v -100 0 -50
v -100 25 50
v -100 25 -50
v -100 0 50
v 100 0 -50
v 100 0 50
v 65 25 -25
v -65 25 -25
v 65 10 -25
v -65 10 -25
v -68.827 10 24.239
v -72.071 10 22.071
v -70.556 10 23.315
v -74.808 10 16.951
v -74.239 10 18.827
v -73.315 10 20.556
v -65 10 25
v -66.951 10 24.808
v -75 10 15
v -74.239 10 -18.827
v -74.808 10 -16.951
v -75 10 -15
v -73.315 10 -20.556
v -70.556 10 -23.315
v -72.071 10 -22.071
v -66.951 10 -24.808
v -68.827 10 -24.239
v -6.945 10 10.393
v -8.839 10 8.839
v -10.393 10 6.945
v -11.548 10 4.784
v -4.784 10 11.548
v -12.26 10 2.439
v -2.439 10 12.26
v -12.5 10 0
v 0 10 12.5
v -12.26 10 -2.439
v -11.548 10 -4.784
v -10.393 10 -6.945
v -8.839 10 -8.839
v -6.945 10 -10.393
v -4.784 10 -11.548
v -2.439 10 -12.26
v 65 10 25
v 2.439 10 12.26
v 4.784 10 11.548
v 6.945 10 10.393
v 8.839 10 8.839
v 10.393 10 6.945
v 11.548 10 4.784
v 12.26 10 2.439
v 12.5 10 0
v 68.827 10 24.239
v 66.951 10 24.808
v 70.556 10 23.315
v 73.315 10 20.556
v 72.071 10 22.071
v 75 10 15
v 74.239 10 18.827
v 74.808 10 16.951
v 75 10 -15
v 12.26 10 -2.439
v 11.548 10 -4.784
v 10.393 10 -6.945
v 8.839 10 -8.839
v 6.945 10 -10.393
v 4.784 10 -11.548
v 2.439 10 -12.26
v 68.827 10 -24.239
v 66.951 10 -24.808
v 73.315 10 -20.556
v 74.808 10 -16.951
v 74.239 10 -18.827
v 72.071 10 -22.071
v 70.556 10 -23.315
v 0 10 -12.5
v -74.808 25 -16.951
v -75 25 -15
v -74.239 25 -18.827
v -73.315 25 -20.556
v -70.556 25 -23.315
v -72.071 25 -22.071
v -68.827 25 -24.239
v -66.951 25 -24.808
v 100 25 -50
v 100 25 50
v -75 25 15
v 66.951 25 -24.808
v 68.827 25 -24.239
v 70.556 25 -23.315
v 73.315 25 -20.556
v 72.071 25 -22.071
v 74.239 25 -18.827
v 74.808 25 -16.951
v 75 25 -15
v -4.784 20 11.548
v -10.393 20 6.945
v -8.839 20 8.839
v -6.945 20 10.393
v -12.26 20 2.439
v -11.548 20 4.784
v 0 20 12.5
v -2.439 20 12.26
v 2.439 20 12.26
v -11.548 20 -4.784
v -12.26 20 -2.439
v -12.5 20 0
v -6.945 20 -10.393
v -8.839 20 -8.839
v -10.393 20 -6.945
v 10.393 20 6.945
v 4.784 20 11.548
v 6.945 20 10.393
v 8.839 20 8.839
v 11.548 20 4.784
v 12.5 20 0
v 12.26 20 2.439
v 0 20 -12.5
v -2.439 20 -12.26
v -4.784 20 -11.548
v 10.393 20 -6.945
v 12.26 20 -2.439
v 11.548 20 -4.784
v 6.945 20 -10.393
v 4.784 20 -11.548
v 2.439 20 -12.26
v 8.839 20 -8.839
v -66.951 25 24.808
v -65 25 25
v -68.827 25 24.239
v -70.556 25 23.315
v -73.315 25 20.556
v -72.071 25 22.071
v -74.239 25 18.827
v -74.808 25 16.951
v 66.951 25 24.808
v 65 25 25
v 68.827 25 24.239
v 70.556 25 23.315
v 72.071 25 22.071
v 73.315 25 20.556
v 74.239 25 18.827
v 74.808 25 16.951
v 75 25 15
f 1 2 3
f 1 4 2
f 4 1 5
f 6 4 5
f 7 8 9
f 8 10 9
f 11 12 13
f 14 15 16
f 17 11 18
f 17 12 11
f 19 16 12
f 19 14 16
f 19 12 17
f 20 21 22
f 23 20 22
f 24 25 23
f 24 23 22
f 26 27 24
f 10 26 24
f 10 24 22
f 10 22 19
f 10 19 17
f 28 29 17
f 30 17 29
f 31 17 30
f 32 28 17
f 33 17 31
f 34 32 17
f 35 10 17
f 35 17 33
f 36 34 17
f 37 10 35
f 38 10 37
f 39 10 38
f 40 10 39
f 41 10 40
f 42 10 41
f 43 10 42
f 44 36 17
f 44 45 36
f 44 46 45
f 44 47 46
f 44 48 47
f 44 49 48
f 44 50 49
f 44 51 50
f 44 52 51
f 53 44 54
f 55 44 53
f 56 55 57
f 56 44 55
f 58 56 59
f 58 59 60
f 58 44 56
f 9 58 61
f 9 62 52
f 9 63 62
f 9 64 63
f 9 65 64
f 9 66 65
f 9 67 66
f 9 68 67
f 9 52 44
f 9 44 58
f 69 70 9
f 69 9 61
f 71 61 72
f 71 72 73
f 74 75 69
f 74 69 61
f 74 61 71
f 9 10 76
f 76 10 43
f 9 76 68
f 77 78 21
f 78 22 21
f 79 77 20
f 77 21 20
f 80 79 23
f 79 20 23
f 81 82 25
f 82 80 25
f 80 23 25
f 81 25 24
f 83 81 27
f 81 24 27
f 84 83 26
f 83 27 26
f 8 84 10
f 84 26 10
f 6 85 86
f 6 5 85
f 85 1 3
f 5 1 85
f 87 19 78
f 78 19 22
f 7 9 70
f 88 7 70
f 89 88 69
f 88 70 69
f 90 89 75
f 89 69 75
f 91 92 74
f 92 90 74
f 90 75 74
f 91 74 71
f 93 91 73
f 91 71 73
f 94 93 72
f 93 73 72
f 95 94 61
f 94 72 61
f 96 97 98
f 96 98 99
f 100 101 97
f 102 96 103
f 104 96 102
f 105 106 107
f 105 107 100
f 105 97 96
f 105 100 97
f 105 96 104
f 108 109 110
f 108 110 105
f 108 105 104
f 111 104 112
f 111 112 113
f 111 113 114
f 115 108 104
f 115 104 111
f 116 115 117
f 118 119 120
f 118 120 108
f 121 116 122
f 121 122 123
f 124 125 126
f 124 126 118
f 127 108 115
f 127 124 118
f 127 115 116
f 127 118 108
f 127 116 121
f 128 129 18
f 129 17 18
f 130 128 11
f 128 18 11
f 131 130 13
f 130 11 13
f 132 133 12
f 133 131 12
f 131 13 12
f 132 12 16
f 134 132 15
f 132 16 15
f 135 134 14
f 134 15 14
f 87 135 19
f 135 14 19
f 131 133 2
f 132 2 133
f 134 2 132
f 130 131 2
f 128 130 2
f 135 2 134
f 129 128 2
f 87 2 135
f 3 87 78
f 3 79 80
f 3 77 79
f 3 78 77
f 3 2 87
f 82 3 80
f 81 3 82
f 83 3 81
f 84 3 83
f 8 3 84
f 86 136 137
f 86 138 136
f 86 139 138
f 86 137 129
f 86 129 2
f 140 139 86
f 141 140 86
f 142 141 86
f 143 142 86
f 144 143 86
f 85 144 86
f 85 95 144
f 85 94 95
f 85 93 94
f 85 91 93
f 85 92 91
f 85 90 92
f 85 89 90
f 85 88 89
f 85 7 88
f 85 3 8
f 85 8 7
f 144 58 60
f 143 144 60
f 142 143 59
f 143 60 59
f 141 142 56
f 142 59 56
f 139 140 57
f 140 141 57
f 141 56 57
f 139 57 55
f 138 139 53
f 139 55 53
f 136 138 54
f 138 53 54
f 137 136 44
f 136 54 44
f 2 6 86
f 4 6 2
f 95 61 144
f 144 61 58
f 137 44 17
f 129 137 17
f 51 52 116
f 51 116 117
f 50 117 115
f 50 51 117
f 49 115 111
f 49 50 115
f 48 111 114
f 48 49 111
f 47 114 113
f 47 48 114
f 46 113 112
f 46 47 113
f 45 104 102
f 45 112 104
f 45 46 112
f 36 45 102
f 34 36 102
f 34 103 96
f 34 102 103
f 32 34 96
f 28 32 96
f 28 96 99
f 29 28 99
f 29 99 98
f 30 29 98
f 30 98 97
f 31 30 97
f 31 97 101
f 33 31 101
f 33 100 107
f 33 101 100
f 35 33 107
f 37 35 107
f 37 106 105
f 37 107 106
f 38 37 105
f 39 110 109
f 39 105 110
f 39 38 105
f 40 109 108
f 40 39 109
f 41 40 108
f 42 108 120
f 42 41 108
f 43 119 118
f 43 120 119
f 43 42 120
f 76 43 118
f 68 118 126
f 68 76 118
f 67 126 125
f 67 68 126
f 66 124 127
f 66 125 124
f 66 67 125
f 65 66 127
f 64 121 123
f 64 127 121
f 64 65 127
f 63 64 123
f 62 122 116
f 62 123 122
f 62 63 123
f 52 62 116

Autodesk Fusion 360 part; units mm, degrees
sketch "Sketch1" plane through (0, 0, 0) normal (0, 1, 0) x (1, 0, 0)
  line L0 (100, -50) -> (-100, -50)
  line L1 (-100, -50) -> (-100, 50)
  line L2 (-100, 50) -> (100, 50)
  line L3 (100, 50) -> (100, -50)
  line L4 (100, -50) -> (-100, 50) construction
  line L5 (-100, -50) -> (100, 50) construction
  line L6 (65, -25) -> (-65, -25)
  line L7 (-75, -15) -> (-75, 15)
  line L8 (-65, 25) -> (65, 25)
  line L9 (75, 15) -> (75, -15)
  line L10 (75, -25) -> (-75, 25) construction
  line L11 (-75, -25) -> (75, 25) construction
  circle A0 centre (0, 0) radius 12.5
  arc A1 (-65, 25) -> (-75, 15) centre (-65, 15) ccw
  arc A2 (-75, -15) -> (-65, -25) centre (-65, -15) ccw
  arc A3 (65, -25) -> (75, -15) centre (65, -15) ccw
  arc A4 (75, 15) -> (65, 25) centre (65, 15) ccw
  dimension "d1" = 200
  dimension "d2" = 100
  dimension "d3" = 150
  dimension "d4" = 50
  dimension "d5" = 25
  dimension "d6" = 10
extrude "Extrude1" add sketch "Sketch1" along normal blind 25 contours L0 L1 L2 L3
extrude "Extrude2" add sketch "Sketch1" along normal blind 10 contours L6 L7 L8 L9 A1 A2 A3 A4
extrude "Extrude3" add sketch "Sketch1" along normal blind 20 contours A0
